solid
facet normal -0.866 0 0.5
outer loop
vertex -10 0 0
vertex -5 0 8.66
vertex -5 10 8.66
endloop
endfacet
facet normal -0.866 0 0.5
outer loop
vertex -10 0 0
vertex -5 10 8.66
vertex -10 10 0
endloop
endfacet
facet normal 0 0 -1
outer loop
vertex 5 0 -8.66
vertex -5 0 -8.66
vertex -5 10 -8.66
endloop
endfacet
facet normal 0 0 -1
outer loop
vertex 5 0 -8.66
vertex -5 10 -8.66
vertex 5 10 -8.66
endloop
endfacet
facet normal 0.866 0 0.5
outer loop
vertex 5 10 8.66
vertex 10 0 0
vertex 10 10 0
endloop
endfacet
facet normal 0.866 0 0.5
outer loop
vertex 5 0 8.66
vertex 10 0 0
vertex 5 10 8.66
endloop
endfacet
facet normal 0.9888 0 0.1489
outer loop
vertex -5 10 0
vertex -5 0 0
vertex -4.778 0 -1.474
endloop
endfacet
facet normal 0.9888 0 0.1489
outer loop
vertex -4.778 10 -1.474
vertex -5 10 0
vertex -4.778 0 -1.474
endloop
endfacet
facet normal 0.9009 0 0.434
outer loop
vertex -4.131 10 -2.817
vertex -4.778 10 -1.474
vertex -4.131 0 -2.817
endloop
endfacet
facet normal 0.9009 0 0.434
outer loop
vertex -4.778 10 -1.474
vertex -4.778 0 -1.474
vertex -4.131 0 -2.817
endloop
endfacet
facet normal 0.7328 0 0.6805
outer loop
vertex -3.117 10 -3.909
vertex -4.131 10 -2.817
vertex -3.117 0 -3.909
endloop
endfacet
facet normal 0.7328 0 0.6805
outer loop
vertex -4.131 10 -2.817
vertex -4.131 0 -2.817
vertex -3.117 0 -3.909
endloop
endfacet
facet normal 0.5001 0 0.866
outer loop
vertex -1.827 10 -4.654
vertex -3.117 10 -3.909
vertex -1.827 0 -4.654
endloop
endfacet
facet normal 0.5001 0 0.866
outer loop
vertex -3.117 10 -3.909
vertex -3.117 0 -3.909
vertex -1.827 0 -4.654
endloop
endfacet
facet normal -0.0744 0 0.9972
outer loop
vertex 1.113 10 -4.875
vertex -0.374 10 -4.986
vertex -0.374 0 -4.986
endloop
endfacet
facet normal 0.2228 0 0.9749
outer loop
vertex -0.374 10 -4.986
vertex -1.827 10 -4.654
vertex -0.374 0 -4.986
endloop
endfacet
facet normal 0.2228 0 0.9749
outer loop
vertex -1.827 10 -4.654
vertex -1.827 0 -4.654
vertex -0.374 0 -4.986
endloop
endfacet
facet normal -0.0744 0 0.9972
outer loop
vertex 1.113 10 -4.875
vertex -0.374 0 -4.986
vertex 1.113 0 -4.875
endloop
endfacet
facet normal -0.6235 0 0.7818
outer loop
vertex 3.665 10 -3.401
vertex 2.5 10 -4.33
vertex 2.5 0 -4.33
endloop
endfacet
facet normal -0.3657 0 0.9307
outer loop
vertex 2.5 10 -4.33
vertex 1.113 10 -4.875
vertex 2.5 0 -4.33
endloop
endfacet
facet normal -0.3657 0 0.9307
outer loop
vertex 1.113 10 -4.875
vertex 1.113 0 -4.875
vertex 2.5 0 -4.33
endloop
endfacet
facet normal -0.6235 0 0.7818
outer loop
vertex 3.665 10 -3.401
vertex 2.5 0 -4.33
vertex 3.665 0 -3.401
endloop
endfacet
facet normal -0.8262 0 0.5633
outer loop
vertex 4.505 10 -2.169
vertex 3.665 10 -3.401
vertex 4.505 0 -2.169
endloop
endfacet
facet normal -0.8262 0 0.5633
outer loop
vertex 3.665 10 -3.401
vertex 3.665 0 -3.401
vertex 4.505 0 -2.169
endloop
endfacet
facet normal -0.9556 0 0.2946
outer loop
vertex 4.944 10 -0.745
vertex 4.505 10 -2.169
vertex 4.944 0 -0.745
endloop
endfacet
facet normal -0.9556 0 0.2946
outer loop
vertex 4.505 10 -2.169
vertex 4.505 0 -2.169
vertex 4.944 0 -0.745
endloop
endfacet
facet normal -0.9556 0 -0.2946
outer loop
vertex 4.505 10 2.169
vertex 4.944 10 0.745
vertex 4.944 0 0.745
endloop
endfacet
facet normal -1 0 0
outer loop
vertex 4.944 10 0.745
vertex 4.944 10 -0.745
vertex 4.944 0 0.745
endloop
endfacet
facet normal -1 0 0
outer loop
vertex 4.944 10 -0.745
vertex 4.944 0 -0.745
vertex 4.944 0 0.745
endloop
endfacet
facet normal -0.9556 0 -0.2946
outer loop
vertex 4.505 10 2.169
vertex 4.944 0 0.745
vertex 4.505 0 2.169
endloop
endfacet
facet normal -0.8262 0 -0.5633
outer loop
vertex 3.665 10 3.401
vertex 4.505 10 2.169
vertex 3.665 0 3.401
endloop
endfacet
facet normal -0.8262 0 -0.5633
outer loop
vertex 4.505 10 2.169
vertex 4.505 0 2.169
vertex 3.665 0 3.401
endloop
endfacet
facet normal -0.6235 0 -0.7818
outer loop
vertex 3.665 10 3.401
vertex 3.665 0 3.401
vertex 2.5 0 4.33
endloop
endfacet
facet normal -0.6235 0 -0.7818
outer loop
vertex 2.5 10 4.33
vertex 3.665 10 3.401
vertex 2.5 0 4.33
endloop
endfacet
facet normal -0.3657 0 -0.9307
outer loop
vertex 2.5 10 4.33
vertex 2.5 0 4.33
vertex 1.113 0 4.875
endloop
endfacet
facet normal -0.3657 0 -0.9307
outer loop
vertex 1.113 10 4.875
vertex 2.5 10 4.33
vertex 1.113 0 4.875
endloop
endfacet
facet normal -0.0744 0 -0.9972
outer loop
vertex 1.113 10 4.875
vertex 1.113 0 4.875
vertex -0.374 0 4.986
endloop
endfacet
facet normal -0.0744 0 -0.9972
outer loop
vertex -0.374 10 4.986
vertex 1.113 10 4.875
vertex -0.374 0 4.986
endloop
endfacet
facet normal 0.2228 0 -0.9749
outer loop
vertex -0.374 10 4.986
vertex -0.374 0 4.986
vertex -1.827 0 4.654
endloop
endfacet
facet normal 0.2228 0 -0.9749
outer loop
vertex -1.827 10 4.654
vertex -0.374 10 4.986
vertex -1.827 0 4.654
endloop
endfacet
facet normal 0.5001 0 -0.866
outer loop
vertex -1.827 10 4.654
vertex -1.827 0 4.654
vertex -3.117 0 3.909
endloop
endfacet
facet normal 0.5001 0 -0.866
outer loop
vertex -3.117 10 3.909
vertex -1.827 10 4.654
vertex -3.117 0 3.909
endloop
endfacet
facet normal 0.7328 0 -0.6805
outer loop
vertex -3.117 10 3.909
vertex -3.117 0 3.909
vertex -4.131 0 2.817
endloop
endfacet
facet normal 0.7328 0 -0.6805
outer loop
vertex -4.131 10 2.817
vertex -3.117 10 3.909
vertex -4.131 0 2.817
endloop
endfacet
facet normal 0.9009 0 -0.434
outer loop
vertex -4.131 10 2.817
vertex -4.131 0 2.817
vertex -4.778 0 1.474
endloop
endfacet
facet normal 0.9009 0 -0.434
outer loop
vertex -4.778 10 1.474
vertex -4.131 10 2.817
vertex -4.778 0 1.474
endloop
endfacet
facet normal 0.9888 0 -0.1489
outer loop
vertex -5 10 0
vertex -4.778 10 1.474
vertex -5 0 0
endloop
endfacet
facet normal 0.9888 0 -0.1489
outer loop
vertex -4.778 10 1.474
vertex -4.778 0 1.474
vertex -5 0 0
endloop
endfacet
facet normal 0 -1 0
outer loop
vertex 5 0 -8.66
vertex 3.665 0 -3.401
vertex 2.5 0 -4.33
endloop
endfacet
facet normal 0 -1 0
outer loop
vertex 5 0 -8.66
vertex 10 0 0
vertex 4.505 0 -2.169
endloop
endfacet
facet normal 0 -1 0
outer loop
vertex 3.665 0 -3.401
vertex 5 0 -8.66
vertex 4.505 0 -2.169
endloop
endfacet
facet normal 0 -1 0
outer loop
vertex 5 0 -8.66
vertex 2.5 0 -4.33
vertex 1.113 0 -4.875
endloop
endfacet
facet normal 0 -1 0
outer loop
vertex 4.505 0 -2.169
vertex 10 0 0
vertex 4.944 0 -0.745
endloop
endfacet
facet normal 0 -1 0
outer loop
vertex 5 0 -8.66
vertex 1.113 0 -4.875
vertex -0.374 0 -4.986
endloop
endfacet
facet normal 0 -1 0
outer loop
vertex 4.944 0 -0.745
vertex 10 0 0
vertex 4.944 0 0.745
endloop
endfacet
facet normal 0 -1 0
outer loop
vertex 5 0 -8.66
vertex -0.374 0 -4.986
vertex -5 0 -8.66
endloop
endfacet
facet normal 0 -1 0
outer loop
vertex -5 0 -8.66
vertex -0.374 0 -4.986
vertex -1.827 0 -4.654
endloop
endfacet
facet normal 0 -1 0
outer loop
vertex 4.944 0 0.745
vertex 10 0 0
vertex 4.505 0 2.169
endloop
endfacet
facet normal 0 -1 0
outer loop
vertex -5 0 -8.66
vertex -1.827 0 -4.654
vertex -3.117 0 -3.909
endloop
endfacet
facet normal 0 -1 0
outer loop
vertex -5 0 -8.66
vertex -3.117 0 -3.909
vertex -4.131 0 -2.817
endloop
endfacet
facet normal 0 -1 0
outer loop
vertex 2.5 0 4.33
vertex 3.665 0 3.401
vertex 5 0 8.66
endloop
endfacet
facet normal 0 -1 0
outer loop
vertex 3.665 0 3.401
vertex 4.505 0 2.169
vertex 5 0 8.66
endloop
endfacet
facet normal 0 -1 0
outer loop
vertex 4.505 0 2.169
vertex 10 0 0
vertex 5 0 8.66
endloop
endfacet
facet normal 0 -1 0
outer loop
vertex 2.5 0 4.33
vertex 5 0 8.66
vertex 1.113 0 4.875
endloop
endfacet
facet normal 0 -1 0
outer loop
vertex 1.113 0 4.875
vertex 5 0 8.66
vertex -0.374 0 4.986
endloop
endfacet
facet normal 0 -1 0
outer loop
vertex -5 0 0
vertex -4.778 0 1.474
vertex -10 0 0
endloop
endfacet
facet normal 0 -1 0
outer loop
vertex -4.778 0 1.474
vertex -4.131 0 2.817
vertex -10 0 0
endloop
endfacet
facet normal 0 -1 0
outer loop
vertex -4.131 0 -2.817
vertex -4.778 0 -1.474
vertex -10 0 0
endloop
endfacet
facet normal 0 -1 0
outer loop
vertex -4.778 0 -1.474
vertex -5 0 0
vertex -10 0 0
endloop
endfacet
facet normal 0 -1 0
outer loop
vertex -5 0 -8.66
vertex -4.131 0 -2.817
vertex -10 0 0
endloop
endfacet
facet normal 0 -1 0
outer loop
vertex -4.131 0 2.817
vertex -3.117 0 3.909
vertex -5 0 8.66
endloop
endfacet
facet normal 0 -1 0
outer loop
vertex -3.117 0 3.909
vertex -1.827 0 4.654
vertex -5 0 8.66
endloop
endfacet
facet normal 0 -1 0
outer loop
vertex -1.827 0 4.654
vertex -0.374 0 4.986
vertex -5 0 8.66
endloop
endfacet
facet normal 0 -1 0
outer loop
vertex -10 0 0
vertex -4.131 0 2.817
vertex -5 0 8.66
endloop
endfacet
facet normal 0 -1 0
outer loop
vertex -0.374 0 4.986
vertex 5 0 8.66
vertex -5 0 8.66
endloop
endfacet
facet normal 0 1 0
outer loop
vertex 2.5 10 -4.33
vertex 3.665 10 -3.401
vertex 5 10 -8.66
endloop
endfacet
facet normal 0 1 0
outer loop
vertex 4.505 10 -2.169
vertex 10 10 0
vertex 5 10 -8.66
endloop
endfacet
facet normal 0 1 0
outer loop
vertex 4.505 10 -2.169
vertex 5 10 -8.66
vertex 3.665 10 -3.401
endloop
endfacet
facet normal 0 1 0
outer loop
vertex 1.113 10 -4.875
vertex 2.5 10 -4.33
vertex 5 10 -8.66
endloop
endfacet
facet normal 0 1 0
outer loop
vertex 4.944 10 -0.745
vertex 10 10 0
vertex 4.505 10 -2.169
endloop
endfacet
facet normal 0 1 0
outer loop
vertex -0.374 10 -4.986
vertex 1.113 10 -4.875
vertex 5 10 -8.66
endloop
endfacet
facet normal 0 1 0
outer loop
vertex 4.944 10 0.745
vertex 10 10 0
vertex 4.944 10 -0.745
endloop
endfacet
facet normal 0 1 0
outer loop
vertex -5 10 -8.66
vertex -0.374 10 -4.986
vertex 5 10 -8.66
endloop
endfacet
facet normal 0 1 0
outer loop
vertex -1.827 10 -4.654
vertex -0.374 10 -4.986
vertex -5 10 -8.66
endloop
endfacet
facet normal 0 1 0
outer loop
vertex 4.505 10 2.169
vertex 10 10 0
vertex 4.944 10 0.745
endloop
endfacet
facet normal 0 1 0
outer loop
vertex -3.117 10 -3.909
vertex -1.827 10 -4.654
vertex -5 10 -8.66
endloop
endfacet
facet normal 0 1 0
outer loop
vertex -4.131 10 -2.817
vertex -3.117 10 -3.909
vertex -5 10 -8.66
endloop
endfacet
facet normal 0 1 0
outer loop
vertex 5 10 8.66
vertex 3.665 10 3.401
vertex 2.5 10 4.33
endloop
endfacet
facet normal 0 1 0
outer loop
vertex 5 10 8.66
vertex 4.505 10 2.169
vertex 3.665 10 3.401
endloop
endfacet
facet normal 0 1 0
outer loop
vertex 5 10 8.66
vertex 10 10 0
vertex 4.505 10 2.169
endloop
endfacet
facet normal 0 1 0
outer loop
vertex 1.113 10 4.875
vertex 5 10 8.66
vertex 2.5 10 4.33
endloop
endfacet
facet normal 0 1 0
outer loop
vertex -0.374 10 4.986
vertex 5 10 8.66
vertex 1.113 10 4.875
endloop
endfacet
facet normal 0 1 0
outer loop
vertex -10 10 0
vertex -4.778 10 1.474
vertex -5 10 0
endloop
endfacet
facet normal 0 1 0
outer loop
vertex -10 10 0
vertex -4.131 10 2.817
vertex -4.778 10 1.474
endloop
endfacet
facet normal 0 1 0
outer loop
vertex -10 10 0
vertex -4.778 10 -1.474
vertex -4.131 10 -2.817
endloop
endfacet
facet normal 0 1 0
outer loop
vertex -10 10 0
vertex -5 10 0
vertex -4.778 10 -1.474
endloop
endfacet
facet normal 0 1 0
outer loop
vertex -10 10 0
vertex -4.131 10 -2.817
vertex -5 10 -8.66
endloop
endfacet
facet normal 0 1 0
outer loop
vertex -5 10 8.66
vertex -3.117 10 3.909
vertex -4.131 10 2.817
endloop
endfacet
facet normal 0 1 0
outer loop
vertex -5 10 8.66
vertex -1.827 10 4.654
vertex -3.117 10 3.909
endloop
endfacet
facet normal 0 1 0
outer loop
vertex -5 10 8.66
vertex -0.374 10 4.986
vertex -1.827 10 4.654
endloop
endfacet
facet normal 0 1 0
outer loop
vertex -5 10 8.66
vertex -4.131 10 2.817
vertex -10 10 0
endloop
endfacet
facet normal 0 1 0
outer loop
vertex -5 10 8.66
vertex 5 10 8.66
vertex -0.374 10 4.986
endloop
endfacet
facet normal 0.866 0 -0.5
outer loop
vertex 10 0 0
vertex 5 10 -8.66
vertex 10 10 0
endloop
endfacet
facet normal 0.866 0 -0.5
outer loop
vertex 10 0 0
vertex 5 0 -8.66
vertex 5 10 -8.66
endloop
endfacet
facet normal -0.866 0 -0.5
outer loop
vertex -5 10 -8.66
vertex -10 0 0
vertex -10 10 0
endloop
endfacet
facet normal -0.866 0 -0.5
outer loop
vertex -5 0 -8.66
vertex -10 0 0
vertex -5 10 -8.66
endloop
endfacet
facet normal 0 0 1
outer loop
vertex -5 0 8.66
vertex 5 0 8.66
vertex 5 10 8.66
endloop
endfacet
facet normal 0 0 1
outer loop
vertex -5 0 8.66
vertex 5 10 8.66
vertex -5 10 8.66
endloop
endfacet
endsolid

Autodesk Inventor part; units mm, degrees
ref_plane "YZ Plane" through (0, 0, 0) normal (1, 0, 0) x (0, 1, 0)
ref_plane "XZ Plane" through (0, 0, 0) normal (0, 1, 0) x (-1, 0, 0)
ref_plane "XY Plane" through (0, 0, 0) normal (0, 0, 1) x (1, 0, 0)
sketch "Sketch1" plane through (0, 0, 0) normal (0, 1, 0) x (-1, 0, 0)
  circle A0 centre (0, 0) radius 10 construction
  line L0 (10, 0) -> (5, -8.6603)
  line L1 (5, -8.6603) -> (-5, -8.6603)
  line L2 (-5, -8.6603) -> (-10, 0)
  line L3 (-10, 0) -> (-5, 8.6603)
  line L4 (-5, 8.6603) -> (5, 8.6603)
  line L5 (5, 8.6603) -> (10, 0)
  circle A1 centre (0, 0) radius 5
  dimension "d0" = 20
  dimension "d3" = 10
extrude "Extrusion1" add sketch "Sketch1" along normal blind 10 contours L0 L1 L2 L3 L4 L5 | A1
extrude "Extrusion2" cut sketch "Sketch1" along normal blind 10 contours A1
thread "Thread1" size "M10x1" class "6H" standard "ISO Metric profile" length 10
properties part number "NutA" material "Titanium"
